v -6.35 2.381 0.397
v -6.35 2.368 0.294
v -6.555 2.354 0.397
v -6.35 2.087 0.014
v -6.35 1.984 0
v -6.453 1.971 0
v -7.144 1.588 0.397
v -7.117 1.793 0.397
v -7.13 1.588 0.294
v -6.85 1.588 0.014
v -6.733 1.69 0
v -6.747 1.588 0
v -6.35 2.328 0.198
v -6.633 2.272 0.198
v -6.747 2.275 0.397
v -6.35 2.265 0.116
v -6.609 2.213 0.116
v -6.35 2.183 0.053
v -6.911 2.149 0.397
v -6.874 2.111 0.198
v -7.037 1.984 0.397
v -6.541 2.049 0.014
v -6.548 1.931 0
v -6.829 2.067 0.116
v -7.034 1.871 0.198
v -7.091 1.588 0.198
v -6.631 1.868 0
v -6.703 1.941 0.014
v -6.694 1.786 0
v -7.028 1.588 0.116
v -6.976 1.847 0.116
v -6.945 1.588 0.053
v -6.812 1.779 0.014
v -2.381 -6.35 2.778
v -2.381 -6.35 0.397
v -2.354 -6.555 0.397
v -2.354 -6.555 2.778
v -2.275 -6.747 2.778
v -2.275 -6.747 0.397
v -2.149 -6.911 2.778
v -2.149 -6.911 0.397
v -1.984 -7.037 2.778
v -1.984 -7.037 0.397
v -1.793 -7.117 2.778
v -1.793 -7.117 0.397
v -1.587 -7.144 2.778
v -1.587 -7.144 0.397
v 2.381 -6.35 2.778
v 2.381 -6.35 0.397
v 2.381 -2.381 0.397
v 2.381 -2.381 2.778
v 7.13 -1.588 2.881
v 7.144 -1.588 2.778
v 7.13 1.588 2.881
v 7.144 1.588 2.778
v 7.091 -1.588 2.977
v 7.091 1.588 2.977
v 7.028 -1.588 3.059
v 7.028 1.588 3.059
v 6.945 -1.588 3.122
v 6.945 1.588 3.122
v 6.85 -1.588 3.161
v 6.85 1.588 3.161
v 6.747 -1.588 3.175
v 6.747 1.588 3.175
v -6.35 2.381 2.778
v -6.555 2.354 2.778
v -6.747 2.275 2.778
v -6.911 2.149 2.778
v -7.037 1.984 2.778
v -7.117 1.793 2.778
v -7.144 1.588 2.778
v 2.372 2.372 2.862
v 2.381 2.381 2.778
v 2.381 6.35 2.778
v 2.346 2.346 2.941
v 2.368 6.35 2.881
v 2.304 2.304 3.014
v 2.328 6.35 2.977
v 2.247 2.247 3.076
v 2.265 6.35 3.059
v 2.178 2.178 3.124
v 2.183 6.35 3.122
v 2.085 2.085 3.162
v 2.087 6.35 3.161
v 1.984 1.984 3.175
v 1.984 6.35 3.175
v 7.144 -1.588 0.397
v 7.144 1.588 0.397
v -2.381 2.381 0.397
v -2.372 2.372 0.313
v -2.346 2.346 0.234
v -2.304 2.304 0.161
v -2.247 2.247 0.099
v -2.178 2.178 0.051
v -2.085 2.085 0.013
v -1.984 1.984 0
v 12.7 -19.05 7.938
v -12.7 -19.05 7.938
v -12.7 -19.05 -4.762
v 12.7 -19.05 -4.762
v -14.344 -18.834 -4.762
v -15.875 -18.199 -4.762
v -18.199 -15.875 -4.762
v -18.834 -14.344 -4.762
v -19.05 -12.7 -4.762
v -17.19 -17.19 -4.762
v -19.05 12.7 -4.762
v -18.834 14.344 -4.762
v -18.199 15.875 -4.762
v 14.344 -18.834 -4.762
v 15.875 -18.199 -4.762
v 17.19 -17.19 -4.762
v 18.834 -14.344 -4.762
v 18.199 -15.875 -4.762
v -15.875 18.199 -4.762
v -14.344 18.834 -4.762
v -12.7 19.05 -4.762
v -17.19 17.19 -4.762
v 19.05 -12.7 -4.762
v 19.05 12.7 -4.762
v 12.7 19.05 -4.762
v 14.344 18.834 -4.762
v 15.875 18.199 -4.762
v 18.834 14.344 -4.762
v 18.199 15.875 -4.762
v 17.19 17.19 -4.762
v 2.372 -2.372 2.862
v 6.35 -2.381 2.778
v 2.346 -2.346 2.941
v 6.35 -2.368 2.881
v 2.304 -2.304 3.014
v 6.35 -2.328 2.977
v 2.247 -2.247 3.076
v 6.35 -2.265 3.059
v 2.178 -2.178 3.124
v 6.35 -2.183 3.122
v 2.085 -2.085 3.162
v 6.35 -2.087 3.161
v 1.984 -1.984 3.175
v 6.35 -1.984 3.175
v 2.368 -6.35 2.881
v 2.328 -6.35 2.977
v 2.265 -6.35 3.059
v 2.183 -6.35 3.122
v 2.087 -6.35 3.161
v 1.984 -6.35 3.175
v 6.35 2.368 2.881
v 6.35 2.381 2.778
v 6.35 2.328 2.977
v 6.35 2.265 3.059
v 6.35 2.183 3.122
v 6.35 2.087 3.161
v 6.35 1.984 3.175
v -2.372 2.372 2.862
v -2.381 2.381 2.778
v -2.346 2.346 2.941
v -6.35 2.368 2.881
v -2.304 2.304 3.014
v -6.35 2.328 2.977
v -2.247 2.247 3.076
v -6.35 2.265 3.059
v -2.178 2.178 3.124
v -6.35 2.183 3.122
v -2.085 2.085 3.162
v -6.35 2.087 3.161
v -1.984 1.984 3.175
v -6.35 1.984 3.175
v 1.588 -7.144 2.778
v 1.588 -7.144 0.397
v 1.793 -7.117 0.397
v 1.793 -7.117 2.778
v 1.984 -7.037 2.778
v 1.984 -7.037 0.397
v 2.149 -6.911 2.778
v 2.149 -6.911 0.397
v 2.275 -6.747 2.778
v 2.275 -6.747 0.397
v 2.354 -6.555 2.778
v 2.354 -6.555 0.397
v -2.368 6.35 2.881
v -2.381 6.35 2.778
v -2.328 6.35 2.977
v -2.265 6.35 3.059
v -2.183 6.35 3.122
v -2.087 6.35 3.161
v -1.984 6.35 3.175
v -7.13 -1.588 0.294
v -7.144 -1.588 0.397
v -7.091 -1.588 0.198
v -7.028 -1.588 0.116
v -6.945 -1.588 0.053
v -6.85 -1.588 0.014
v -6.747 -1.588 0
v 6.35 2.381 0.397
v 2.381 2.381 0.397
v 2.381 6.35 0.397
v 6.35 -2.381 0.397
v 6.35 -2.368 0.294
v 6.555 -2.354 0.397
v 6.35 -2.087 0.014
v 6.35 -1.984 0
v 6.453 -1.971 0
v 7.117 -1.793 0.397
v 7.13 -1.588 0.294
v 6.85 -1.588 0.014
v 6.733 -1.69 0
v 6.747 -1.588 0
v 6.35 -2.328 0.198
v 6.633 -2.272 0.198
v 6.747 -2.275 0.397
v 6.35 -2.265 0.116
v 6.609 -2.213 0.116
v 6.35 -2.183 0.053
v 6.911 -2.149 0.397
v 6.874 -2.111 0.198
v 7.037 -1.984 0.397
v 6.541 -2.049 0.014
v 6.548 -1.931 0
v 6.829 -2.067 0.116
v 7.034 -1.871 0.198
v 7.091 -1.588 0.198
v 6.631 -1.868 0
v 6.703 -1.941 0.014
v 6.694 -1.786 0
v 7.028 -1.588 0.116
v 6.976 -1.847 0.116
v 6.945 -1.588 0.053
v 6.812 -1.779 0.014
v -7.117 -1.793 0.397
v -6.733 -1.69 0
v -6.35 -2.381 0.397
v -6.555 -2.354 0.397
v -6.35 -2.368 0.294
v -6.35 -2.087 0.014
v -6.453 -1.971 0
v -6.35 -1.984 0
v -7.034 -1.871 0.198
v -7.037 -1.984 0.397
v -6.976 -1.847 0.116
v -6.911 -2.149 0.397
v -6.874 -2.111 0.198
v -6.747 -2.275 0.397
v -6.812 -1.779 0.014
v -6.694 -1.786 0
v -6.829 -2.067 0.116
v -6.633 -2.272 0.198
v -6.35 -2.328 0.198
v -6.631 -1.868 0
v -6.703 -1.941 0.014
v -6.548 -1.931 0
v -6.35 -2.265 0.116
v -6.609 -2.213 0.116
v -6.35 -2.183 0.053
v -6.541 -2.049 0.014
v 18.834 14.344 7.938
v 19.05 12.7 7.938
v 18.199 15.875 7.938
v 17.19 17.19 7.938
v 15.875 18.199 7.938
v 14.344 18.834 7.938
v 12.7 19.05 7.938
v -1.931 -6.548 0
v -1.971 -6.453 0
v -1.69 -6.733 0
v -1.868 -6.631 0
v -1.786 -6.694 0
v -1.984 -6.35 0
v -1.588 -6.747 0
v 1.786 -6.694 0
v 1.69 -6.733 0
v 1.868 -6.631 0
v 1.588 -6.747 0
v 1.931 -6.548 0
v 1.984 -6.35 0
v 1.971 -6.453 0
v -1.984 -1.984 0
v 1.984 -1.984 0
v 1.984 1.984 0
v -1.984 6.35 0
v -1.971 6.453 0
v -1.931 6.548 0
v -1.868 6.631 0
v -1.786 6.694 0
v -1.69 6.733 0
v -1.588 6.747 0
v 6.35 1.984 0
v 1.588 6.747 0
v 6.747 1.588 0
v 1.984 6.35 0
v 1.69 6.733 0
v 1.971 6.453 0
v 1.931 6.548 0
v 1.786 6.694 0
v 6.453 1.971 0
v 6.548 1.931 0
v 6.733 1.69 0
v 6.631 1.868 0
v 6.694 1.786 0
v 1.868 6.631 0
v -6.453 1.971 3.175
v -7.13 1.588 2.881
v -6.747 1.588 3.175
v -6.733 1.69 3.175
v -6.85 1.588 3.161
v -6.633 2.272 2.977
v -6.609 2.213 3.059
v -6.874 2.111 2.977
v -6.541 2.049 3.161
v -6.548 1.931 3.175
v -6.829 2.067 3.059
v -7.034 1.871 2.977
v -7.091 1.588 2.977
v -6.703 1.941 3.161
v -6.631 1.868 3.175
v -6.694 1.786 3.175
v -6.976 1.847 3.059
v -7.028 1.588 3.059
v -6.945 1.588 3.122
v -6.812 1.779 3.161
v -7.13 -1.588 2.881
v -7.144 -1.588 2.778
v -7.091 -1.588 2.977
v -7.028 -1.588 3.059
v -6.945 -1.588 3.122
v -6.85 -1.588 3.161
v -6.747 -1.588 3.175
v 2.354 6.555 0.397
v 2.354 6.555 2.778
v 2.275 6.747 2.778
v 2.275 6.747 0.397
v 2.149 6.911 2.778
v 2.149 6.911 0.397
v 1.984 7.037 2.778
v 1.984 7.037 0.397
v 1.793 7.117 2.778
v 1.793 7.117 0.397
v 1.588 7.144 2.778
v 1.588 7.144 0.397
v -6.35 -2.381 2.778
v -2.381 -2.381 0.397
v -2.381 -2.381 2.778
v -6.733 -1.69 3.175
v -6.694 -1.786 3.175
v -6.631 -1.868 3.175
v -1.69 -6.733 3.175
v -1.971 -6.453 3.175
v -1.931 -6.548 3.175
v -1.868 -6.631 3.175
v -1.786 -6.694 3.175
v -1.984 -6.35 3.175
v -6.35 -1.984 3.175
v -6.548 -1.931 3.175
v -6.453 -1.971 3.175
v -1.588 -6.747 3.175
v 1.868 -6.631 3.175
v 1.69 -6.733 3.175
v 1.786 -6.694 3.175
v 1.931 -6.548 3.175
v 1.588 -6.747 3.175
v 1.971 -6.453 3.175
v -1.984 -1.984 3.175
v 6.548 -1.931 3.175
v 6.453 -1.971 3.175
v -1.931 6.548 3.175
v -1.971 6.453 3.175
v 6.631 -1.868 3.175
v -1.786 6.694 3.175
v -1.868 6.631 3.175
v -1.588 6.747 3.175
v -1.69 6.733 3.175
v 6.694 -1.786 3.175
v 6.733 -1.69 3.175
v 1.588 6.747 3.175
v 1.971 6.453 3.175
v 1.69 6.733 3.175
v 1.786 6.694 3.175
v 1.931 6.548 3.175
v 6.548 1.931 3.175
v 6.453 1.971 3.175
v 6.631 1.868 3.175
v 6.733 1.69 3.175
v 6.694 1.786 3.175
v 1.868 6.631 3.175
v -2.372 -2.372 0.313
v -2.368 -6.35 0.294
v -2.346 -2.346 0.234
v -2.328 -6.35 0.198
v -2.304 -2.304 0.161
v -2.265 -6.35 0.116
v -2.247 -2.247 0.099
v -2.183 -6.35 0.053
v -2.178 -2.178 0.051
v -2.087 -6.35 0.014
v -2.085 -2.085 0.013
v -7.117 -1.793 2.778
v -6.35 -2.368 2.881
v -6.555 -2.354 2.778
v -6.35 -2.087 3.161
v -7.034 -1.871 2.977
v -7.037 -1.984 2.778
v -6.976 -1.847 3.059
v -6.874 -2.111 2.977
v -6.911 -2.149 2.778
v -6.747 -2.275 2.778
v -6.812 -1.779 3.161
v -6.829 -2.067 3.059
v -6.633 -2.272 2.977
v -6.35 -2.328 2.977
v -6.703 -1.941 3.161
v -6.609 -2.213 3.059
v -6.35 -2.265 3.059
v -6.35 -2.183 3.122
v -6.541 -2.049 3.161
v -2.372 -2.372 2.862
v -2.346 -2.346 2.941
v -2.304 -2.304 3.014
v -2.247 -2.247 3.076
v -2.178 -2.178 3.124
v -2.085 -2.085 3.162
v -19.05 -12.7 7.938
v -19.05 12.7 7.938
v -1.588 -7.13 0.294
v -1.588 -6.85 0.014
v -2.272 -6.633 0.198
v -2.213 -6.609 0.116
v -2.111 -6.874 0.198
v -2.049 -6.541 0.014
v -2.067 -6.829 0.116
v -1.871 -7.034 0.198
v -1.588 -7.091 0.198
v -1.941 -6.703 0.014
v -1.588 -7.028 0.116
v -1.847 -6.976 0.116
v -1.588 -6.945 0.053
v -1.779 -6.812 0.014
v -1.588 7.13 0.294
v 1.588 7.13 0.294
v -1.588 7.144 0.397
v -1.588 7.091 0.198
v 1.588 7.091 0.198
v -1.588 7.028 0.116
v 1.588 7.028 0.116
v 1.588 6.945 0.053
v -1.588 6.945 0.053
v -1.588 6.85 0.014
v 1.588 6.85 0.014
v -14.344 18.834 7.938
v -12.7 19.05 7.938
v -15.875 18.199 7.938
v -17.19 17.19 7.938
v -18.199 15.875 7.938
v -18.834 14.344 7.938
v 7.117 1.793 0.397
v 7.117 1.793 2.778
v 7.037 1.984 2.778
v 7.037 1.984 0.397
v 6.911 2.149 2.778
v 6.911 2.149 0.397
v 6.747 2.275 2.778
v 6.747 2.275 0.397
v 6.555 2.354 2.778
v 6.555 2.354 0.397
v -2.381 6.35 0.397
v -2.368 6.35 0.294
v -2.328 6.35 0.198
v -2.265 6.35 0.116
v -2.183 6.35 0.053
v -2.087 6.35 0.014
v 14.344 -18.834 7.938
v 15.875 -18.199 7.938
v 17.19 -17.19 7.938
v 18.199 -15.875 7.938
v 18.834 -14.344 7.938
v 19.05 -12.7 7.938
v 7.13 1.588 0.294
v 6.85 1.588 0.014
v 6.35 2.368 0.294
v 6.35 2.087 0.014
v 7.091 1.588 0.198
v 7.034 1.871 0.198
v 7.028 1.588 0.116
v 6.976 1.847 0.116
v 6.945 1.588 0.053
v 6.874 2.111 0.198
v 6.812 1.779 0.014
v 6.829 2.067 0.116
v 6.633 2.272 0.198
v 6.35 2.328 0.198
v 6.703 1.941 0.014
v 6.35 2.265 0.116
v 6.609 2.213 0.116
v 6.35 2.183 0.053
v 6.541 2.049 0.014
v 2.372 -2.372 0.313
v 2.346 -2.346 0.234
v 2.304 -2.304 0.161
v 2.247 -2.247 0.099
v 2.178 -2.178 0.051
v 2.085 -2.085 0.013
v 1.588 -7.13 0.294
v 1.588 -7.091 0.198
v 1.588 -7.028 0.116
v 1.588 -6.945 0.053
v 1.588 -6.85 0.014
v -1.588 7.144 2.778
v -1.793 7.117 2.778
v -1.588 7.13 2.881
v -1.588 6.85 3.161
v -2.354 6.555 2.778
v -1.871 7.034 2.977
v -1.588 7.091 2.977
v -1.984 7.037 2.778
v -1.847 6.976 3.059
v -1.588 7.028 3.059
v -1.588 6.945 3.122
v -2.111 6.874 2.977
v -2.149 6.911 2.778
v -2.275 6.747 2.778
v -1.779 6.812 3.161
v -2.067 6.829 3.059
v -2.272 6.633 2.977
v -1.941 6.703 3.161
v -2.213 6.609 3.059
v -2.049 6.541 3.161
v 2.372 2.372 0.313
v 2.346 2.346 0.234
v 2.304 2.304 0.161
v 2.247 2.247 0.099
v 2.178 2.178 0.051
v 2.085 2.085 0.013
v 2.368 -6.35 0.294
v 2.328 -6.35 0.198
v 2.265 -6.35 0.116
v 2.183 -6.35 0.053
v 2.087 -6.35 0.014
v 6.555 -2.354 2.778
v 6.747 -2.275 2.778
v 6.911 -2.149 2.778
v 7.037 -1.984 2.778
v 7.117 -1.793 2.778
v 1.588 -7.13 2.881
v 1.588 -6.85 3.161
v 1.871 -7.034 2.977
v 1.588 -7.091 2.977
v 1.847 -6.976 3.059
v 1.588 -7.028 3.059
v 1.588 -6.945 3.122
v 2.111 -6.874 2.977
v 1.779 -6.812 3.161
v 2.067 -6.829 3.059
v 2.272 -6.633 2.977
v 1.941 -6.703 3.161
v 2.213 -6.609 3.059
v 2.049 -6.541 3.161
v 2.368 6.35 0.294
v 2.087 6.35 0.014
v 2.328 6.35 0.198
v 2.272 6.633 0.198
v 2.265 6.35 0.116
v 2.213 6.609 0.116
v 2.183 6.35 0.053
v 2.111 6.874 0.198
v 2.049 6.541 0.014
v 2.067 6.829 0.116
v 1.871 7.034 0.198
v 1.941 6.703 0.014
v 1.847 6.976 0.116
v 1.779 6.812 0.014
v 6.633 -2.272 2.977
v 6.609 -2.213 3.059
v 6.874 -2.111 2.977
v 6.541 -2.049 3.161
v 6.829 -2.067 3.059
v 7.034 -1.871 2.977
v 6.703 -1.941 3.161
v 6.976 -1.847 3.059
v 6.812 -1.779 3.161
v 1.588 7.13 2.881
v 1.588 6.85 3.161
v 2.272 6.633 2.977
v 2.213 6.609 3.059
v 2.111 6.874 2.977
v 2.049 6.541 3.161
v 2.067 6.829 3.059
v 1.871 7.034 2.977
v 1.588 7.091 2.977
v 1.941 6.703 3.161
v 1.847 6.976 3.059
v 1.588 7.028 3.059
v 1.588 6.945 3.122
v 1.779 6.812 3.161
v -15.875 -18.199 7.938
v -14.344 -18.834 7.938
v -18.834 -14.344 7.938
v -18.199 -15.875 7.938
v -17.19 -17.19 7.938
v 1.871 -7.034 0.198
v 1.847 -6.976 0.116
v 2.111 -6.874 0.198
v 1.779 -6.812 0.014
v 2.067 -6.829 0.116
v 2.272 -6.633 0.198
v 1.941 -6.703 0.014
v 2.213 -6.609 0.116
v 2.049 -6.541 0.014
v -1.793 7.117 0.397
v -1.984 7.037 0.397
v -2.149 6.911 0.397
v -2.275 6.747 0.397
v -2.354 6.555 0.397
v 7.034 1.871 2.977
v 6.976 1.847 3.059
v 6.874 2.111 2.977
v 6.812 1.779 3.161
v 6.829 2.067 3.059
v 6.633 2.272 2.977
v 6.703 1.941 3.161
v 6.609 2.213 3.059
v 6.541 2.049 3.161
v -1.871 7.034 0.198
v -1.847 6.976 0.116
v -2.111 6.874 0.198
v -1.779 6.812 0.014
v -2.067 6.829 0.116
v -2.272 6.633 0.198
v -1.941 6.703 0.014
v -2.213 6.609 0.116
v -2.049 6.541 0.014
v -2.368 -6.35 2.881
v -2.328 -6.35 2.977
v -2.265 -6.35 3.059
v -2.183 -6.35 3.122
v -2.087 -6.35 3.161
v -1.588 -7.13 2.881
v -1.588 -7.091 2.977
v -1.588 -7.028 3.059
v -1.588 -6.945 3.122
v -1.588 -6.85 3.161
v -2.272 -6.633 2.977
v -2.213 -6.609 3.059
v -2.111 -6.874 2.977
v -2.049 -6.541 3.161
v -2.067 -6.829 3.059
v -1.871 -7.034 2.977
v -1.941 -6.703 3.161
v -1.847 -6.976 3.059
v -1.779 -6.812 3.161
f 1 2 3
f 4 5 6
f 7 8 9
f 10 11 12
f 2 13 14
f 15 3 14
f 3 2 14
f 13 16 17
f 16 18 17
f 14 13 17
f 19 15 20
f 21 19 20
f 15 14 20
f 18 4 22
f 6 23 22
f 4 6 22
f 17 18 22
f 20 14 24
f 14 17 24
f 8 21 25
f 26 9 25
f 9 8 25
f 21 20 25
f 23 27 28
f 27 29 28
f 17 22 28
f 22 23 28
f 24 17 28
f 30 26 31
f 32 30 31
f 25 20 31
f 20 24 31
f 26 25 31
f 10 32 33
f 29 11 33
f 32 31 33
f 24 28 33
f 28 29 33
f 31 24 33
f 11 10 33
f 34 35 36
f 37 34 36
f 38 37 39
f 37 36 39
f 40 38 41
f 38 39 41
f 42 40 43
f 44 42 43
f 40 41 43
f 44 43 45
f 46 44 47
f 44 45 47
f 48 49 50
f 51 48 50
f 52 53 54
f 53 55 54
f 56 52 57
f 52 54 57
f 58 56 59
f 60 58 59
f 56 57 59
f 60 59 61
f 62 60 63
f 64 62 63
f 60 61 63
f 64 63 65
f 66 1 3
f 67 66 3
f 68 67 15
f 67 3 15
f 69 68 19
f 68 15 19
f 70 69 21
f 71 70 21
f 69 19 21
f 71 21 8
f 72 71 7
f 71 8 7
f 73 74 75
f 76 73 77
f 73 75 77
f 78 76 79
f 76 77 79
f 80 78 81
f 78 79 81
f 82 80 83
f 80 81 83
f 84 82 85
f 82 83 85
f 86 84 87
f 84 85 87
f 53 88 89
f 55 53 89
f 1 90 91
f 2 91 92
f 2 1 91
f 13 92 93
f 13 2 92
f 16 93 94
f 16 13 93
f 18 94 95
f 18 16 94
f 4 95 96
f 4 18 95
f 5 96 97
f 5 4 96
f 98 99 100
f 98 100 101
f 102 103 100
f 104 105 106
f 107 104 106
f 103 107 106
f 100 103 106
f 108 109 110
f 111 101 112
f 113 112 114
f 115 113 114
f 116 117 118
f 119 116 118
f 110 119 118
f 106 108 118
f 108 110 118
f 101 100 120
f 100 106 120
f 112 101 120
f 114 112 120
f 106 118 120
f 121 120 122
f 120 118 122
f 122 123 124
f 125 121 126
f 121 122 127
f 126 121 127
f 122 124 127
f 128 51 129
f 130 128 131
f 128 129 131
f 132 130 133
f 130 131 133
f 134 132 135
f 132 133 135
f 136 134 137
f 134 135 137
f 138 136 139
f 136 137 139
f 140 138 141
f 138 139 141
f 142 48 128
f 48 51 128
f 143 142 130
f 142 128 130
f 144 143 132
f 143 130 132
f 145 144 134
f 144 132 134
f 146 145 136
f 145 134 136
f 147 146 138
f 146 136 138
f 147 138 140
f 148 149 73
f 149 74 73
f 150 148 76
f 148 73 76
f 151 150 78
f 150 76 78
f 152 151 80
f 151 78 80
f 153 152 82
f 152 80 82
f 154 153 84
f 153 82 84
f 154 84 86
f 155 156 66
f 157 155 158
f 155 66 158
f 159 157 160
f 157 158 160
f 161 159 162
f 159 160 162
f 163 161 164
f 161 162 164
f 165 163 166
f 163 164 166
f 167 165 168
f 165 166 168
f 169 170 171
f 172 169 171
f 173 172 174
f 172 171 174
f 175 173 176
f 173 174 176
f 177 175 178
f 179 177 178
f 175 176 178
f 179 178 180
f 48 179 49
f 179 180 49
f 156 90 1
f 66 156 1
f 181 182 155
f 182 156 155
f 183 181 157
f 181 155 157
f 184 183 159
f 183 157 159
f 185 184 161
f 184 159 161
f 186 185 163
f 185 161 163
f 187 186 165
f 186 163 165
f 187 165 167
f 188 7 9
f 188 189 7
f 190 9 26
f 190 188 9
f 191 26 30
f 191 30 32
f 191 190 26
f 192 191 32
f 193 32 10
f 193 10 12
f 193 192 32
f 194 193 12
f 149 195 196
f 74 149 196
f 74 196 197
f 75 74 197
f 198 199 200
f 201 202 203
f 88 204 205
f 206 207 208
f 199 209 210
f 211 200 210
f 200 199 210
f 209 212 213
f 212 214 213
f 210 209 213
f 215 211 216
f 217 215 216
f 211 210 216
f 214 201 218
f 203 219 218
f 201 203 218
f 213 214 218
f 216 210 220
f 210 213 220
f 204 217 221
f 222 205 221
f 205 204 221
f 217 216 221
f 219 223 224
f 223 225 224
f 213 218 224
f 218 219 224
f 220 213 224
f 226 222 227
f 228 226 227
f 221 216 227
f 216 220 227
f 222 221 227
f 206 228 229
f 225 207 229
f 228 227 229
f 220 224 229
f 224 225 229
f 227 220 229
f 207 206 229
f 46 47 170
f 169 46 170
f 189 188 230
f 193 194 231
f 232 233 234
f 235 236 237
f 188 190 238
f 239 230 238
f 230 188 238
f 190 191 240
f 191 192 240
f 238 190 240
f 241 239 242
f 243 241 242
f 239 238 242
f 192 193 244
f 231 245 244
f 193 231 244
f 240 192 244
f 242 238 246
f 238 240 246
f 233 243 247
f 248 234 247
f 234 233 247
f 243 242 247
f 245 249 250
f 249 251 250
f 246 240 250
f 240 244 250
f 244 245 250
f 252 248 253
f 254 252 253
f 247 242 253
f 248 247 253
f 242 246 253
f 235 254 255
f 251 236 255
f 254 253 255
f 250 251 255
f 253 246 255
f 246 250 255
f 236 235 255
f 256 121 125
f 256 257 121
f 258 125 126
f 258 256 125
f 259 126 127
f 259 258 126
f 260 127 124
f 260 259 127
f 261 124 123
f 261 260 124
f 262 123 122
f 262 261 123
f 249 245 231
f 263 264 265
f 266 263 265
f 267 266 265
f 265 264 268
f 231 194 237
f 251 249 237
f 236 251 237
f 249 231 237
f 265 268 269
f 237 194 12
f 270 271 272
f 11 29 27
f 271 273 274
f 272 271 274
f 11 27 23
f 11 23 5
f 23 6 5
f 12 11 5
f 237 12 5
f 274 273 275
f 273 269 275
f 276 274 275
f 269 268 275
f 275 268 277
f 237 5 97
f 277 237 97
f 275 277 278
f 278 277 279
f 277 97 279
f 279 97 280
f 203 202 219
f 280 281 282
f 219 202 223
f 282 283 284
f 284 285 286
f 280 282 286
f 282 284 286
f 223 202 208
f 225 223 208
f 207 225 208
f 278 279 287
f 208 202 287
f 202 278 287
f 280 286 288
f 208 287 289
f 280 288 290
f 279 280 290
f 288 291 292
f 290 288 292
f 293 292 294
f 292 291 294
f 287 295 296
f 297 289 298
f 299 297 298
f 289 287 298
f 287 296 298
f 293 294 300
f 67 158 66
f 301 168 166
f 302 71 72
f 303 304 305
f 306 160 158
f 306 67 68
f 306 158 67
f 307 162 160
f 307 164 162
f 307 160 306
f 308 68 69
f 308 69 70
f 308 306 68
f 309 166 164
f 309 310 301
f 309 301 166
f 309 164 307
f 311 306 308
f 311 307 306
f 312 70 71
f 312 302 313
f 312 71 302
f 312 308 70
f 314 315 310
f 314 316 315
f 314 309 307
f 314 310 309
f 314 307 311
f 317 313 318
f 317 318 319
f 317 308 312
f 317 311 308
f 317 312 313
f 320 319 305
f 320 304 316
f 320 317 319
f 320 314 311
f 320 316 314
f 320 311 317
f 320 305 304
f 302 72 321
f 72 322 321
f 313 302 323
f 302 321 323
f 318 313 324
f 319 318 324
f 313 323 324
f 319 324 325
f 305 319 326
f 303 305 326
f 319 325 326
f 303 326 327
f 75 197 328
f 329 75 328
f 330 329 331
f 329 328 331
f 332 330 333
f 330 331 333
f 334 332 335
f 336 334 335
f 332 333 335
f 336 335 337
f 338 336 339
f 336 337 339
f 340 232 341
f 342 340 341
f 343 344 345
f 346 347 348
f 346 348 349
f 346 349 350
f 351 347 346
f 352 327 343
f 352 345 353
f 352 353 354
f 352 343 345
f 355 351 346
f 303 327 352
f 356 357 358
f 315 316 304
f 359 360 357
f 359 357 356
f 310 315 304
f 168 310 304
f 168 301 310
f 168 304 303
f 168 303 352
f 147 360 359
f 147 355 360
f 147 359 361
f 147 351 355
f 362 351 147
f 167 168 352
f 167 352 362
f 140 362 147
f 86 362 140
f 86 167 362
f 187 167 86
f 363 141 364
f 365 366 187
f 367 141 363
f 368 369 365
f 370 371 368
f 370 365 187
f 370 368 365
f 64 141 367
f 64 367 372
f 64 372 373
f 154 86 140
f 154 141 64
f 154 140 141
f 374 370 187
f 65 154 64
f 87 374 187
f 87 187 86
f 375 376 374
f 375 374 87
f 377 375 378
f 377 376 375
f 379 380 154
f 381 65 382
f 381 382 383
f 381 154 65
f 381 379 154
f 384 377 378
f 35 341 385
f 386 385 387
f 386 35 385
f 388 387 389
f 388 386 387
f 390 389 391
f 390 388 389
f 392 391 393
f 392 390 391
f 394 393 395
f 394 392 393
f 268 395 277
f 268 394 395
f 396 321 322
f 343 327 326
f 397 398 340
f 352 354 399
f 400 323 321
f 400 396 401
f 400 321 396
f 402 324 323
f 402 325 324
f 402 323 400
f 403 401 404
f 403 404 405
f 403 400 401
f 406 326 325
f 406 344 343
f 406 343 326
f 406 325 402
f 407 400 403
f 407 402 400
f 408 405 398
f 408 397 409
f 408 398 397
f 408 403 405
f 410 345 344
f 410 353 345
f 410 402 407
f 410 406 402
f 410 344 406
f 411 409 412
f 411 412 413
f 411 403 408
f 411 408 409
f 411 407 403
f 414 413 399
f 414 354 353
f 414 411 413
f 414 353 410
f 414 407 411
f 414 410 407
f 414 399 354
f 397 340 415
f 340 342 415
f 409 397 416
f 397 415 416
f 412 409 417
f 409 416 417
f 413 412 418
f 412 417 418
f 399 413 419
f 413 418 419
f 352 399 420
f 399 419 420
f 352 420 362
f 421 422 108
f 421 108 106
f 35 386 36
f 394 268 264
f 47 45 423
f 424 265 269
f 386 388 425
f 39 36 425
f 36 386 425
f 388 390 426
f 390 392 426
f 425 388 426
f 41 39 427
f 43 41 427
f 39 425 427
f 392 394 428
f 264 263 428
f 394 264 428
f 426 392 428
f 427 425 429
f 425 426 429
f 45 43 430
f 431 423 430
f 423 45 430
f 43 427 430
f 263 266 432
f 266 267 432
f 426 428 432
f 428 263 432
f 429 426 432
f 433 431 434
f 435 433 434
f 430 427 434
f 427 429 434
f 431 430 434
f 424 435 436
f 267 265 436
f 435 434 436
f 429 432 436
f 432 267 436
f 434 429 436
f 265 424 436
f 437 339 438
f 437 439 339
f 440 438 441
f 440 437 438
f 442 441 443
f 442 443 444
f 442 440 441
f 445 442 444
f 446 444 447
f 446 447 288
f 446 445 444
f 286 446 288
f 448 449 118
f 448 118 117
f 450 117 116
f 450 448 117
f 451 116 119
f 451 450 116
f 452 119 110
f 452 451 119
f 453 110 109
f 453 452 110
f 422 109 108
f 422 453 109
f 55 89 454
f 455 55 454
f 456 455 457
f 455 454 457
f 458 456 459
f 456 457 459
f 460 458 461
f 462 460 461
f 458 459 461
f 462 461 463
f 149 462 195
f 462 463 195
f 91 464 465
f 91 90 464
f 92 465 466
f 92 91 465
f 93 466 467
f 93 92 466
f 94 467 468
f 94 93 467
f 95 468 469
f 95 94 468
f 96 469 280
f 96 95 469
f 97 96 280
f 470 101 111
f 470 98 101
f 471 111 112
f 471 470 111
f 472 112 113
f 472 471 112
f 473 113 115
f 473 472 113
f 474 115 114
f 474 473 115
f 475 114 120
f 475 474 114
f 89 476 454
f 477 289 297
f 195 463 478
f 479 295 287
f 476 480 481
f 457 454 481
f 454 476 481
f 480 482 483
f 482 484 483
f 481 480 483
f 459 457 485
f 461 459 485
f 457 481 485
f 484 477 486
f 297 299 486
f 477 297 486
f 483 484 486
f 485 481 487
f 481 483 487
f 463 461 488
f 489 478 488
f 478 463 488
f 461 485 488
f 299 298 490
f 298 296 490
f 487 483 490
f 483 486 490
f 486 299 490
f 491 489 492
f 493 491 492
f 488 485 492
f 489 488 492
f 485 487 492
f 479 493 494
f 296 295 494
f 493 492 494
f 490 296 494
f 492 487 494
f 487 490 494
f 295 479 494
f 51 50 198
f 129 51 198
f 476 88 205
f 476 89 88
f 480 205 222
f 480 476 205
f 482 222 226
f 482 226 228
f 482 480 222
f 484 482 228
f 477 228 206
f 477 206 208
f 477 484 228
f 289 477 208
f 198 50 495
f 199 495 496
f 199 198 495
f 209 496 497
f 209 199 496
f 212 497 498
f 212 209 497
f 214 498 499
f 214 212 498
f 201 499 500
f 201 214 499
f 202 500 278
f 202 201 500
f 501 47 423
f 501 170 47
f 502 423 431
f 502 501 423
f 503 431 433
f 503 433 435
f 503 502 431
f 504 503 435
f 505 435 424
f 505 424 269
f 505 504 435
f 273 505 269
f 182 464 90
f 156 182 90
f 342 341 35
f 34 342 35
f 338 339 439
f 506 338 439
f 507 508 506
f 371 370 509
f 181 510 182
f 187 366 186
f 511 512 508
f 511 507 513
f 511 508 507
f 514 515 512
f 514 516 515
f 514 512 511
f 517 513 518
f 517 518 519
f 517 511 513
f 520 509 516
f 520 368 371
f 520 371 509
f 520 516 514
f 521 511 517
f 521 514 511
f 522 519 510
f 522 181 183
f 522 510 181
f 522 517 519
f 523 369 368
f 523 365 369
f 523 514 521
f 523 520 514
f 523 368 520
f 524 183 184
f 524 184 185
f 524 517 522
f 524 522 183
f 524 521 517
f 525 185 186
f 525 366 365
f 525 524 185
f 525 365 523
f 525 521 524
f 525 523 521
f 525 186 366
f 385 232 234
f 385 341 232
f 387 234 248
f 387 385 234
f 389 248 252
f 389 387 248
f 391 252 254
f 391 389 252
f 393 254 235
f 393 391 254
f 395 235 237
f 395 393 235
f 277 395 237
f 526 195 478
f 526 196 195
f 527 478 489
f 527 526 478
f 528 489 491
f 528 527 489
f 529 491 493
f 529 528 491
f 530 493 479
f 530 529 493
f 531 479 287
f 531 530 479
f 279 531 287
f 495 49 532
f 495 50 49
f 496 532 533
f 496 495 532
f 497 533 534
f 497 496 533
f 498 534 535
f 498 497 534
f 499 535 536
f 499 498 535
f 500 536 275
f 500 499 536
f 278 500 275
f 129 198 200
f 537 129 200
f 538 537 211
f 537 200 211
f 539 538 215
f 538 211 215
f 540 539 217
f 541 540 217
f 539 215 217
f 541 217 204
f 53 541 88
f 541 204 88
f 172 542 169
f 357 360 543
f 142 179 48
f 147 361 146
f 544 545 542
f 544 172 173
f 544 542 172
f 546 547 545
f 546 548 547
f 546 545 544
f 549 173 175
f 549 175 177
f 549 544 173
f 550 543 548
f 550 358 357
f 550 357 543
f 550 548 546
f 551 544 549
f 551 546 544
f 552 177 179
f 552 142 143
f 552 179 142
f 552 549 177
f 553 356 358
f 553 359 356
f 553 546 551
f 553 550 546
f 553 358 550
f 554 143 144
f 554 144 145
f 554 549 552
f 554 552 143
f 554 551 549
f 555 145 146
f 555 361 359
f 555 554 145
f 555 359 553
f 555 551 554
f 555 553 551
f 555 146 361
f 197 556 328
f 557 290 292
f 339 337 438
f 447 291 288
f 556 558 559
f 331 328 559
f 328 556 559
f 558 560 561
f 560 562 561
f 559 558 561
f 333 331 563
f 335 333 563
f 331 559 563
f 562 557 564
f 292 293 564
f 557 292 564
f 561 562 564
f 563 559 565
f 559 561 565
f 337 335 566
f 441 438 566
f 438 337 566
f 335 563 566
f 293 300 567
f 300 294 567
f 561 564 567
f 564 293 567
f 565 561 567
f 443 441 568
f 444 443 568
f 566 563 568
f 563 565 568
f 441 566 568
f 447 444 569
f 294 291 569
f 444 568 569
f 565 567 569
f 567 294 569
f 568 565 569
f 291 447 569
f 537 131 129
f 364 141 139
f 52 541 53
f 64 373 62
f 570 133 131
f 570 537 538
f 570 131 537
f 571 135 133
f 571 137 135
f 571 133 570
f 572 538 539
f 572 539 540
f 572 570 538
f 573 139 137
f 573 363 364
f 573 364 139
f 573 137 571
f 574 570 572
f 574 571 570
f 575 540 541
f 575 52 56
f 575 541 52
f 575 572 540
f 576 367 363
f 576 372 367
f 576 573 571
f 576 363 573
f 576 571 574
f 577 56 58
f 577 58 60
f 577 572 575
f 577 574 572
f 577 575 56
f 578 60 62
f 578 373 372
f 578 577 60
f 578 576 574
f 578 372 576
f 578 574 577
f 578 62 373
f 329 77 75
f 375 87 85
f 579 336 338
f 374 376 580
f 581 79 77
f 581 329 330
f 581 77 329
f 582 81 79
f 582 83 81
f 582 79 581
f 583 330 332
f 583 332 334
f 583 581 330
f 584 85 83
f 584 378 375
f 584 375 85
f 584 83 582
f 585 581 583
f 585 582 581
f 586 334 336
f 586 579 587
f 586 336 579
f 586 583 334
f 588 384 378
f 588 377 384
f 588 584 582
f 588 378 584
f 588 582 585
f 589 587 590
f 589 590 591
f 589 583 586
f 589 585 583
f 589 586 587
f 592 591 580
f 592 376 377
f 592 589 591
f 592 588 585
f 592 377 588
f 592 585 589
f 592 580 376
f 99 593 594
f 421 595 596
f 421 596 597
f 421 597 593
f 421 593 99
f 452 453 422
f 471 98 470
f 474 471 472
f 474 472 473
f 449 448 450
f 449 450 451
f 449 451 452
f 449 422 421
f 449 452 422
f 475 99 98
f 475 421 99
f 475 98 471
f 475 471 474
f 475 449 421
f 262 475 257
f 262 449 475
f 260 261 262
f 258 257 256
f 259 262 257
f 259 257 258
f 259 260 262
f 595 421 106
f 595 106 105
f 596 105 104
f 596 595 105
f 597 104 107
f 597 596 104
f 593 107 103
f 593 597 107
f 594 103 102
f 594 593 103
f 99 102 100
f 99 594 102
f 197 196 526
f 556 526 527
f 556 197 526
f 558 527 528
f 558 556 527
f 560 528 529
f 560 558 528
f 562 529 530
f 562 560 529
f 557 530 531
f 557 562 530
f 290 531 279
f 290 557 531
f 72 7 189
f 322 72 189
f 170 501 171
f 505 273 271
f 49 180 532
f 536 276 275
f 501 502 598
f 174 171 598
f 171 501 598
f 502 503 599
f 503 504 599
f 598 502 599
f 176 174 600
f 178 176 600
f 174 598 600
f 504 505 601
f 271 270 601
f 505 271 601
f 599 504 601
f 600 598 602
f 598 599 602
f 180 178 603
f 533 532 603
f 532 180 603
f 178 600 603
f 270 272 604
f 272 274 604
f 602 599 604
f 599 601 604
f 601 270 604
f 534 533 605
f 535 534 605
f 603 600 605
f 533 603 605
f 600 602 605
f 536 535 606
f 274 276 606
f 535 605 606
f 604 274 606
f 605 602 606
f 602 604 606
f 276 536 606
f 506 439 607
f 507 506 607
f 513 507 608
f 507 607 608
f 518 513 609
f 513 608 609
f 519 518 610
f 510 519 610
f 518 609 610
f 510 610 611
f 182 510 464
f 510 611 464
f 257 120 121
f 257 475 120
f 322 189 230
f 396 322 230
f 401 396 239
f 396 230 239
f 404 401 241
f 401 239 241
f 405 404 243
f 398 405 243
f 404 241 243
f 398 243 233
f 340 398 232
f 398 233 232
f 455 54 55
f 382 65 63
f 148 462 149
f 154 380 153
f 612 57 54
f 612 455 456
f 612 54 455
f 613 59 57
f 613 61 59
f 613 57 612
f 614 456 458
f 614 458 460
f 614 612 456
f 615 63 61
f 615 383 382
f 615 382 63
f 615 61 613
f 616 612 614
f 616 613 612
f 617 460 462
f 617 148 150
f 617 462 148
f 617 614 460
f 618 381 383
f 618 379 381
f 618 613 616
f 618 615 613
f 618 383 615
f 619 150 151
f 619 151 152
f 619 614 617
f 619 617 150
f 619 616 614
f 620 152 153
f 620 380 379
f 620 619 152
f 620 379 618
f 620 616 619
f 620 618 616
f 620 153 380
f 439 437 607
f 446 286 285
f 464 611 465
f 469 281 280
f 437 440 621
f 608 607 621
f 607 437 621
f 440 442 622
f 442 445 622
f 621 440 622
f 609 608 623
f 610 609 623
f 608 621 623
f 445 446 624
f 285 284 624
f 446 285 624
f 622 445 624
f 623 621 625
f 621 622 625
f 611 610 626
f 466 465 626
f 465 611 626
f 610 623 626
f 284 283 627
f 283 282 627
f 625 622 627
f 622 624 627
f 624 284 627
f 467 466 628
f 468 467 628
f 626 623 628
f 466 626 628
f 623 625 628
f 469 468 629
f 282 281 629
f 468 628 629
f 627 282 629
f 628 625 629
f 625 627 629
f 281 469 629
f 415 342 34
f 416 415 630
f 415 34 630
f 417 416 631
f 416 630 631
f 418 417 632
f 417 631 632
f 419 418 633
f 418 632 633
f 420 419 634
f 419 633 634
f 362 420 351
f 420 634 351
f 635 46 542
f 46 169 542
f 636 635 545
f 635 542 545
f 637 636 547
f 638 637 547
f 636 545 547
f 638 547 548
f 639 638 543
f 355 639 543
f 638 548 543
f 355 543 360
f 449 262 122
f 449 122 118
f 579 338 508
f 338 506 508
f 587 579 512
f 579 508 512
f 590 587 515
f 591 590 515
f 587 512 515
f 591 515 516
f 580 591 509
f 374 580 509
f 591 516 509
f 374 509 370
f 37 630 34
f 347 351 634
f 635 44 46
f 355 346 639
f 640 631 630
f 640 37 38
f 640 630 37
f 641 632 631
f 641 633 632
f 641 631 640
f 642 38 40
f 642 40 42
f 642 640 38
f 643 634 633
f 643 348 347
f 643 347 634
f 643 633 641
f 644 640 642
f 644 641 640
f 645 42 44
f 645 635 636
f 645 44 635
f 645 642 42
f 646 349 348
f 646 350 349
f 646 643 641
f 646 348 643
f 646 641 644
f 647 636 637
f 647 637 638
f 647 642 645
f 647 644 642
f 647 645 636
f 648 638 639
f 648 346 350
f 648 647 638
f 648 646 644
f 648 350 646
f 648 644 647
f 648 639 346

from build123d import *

# Parameters (mm, degrees)
F0_W          = 4.7625
F0_H          = 4.7625
F1_DEPTH      = 3.175
F2_R          = 0.396875
F5_DEPTH      = 6.35
F5_DEPTH_BACK = 6.35


# Not quite as in the source:
# - a length typed as a fraction of an inch, garbled in the dataset ("3 / 203.2 mm" for 3/8 in), is restored


with BuildPart() as f1:
    # F0 (on Top) → F1 (new body)
    with BuildSketch(Plane.XY):
        with BuildLine():
            ThreePointArc((2.38125, 6.35), (2.1487660076, 6.9112660076), (1.5875, 7.14375))
            Line((1.5875, 7.14375), (-1.5875, 7.14375))
            ThreePointArc((-1.5875, 7.14375), (-2.1487660076, 6.9112660076), (-2.38125, 6.35))
            Line((-2.38125, 6.35), (-2.38125, 2.38125))
            Line((-2.38125, 2.38125), (2.38125, 2.38125))
            Line((2.38125, 2.38125), (2.38125, 6.35))
        make_face()
        with BuildLine():
            Line((6.35, 2.38125), (2.38125, 2.38125))
            Line((2.38125, 2.38125), (2.38125, -2.38125))
            Line((2.38125, -2.38125), (6.35, -2.38125))
            ThreePointArc((6.35, -2.38125), (6.9112660076, -2.1487660076), (7.14375, -1.5875))
            Line((7.14375, -1.5875), (7.14375, 1.5875))
            ThreePointArc((7.14375, 1.5875), (6.9112660076, 2.1487660076), (6.35, 2.38125))
        make_face()
        Rectangle(F0_W, F0_H)
        with BuildLine():
            Line((-2.38125, -2.38125), (-2.38125, 2.38125))
            Line((-2.38125, 2.38125), (-6.35, 2.38125))
            ThreePointArc((-6.35, 2.38125), (-6.9112660076, 2.1487660076), (-7.14375, 1.5875))
            Line((-7.14375, 1.5875), (-7.14375, -1.5875))
            ThreePointArc((-7.14375, -1.5875), (-6.9112660076, -2.1487660076), (-6.35, -2.38125))
            Line((-6.35, -2.38125), (-2.38125, -2.38125))
        make_face()
        with BuildLine():
            Line((2.38125, -6.35), (2.38125, -2.38125))
            Line((2.38125, -2.38125), (-2.38125, -2.38125))
            Line((-2.38125, -2.38125), (-2.38125, -6.35))
            ThreePointArc((-2.38125, -6.35), (-2.1487660076, -6.9112660076), (-1.5875, -7.14375))
            Line((-1.5875, -7.14375), (1.5875, -7.14375))
            ThreePointArc((1.5875, -7.14375), (2.1487660076, -6.9112660076), (2.38125, -6.35))
        make_face()
    extrude(amount=F1_DEPTH)

    # F2
    f2_edges = [f1.edges().sort_by_distance(p)[0] for p in [
        (2.38125, 4.365625, 3.175),
        (2.148766, 6.911266, 3.175),
        (0, 7.14375, 3.175),
        (-2.148766, 6.911266, 3.175),
        (-2.38125, 4.365625, 3.175),
        (-4.365625, 2.38125, 3.175),
        (-6.911266, 2.148766, 3.175),
        (-7.14375, 0, 3.175),
        (-6.911266, -2.148766, 3.175),
        (-4.365625, -2.38125, 3.175),
        (-2.38125, -4.365625, 3.175),
        (-2.148766, -6.911266, 3.175),
        (0, -7.14375, 3.175),
        (2.148766, -6.911266, 3.175),
        (2.38125, -4.365625, 3.175),
        (4.365625, -2.38125, 3.175),
        (6.911266, -2.148766, 3.175),
        (7.14375, 0, 3.175),
        (6.911266, 2.148766, 3.175),
        (4.365625, 2.38125, 3.175),
        (2.38125, 4.365625, 0),
        (2.148766, 6.911266, 0),
        (0, 7.14375, 0),
        (-2.148766, 6.911266, 0),
        (-2.38125, 4.365625, 0),
        (-4.365625, 2.38125, 0),
        (-6.911266, 2.148766, 0),
        (-7.14375, 0, 0),
        (-6.911266, -2.148766, 0),
        (-4.365625, -2.38125, 0),
        (-2.38125, -4.365625, 0),
        (-2.148766, -6.911266, 0),
        (0, -7.14375, 0),
        (2.148766, -6.911266, 0),
        (2.38125, -4.365625, 0),
        (4.365625, -2.38125, 0),
        (6.911266, -2.148766, 0),
        (7.14375, 0, 0),
        (6.911266, 2.148766, 0),
        (4.365625, 2.38125, 0),
    ]]
    fillet(f2_edges, radius=F2_R)


with BuildPart() as f5:
    # F4 (on offset) → F5 (new body, two sides)
    with BuildSketch(Plane.XY.offset(1.5875)) as f5_sk:
        with BuildLine():
            ThreePointArc((19.05, 12.7), (17.1901280605, 17.1901280605), (12.7, 19.05))
            Line((12.7, 19.05), (-12.7, 19.05))
            ThreePointArc((-12.7, 19.05), (-17.1901280605, 17.1901280605), (-19.05, 12.7))
            Line((-19.05, 12.7), (-19.05, -12.7))
            ThreePointArc((-19.05, -12.7), (-17.1901280605, -17.1901280605), (-12.7, -19.05))
            Line((-12.7, -19.05), (12.7, -19.05))
            ThreePointArc((12.7, -19.05), (17.1901280605, -17.1901280605), (19.05, -12.7))
            Line((19.05, -12.7), (19.05, 12.7))
        make_face()
    extrude(amount=F5_DEPTH)
    extrude(f5_sk.sketch, amount=-F5_DEPTH_BACK)


solid = Compound([f1.part, f5.part])
